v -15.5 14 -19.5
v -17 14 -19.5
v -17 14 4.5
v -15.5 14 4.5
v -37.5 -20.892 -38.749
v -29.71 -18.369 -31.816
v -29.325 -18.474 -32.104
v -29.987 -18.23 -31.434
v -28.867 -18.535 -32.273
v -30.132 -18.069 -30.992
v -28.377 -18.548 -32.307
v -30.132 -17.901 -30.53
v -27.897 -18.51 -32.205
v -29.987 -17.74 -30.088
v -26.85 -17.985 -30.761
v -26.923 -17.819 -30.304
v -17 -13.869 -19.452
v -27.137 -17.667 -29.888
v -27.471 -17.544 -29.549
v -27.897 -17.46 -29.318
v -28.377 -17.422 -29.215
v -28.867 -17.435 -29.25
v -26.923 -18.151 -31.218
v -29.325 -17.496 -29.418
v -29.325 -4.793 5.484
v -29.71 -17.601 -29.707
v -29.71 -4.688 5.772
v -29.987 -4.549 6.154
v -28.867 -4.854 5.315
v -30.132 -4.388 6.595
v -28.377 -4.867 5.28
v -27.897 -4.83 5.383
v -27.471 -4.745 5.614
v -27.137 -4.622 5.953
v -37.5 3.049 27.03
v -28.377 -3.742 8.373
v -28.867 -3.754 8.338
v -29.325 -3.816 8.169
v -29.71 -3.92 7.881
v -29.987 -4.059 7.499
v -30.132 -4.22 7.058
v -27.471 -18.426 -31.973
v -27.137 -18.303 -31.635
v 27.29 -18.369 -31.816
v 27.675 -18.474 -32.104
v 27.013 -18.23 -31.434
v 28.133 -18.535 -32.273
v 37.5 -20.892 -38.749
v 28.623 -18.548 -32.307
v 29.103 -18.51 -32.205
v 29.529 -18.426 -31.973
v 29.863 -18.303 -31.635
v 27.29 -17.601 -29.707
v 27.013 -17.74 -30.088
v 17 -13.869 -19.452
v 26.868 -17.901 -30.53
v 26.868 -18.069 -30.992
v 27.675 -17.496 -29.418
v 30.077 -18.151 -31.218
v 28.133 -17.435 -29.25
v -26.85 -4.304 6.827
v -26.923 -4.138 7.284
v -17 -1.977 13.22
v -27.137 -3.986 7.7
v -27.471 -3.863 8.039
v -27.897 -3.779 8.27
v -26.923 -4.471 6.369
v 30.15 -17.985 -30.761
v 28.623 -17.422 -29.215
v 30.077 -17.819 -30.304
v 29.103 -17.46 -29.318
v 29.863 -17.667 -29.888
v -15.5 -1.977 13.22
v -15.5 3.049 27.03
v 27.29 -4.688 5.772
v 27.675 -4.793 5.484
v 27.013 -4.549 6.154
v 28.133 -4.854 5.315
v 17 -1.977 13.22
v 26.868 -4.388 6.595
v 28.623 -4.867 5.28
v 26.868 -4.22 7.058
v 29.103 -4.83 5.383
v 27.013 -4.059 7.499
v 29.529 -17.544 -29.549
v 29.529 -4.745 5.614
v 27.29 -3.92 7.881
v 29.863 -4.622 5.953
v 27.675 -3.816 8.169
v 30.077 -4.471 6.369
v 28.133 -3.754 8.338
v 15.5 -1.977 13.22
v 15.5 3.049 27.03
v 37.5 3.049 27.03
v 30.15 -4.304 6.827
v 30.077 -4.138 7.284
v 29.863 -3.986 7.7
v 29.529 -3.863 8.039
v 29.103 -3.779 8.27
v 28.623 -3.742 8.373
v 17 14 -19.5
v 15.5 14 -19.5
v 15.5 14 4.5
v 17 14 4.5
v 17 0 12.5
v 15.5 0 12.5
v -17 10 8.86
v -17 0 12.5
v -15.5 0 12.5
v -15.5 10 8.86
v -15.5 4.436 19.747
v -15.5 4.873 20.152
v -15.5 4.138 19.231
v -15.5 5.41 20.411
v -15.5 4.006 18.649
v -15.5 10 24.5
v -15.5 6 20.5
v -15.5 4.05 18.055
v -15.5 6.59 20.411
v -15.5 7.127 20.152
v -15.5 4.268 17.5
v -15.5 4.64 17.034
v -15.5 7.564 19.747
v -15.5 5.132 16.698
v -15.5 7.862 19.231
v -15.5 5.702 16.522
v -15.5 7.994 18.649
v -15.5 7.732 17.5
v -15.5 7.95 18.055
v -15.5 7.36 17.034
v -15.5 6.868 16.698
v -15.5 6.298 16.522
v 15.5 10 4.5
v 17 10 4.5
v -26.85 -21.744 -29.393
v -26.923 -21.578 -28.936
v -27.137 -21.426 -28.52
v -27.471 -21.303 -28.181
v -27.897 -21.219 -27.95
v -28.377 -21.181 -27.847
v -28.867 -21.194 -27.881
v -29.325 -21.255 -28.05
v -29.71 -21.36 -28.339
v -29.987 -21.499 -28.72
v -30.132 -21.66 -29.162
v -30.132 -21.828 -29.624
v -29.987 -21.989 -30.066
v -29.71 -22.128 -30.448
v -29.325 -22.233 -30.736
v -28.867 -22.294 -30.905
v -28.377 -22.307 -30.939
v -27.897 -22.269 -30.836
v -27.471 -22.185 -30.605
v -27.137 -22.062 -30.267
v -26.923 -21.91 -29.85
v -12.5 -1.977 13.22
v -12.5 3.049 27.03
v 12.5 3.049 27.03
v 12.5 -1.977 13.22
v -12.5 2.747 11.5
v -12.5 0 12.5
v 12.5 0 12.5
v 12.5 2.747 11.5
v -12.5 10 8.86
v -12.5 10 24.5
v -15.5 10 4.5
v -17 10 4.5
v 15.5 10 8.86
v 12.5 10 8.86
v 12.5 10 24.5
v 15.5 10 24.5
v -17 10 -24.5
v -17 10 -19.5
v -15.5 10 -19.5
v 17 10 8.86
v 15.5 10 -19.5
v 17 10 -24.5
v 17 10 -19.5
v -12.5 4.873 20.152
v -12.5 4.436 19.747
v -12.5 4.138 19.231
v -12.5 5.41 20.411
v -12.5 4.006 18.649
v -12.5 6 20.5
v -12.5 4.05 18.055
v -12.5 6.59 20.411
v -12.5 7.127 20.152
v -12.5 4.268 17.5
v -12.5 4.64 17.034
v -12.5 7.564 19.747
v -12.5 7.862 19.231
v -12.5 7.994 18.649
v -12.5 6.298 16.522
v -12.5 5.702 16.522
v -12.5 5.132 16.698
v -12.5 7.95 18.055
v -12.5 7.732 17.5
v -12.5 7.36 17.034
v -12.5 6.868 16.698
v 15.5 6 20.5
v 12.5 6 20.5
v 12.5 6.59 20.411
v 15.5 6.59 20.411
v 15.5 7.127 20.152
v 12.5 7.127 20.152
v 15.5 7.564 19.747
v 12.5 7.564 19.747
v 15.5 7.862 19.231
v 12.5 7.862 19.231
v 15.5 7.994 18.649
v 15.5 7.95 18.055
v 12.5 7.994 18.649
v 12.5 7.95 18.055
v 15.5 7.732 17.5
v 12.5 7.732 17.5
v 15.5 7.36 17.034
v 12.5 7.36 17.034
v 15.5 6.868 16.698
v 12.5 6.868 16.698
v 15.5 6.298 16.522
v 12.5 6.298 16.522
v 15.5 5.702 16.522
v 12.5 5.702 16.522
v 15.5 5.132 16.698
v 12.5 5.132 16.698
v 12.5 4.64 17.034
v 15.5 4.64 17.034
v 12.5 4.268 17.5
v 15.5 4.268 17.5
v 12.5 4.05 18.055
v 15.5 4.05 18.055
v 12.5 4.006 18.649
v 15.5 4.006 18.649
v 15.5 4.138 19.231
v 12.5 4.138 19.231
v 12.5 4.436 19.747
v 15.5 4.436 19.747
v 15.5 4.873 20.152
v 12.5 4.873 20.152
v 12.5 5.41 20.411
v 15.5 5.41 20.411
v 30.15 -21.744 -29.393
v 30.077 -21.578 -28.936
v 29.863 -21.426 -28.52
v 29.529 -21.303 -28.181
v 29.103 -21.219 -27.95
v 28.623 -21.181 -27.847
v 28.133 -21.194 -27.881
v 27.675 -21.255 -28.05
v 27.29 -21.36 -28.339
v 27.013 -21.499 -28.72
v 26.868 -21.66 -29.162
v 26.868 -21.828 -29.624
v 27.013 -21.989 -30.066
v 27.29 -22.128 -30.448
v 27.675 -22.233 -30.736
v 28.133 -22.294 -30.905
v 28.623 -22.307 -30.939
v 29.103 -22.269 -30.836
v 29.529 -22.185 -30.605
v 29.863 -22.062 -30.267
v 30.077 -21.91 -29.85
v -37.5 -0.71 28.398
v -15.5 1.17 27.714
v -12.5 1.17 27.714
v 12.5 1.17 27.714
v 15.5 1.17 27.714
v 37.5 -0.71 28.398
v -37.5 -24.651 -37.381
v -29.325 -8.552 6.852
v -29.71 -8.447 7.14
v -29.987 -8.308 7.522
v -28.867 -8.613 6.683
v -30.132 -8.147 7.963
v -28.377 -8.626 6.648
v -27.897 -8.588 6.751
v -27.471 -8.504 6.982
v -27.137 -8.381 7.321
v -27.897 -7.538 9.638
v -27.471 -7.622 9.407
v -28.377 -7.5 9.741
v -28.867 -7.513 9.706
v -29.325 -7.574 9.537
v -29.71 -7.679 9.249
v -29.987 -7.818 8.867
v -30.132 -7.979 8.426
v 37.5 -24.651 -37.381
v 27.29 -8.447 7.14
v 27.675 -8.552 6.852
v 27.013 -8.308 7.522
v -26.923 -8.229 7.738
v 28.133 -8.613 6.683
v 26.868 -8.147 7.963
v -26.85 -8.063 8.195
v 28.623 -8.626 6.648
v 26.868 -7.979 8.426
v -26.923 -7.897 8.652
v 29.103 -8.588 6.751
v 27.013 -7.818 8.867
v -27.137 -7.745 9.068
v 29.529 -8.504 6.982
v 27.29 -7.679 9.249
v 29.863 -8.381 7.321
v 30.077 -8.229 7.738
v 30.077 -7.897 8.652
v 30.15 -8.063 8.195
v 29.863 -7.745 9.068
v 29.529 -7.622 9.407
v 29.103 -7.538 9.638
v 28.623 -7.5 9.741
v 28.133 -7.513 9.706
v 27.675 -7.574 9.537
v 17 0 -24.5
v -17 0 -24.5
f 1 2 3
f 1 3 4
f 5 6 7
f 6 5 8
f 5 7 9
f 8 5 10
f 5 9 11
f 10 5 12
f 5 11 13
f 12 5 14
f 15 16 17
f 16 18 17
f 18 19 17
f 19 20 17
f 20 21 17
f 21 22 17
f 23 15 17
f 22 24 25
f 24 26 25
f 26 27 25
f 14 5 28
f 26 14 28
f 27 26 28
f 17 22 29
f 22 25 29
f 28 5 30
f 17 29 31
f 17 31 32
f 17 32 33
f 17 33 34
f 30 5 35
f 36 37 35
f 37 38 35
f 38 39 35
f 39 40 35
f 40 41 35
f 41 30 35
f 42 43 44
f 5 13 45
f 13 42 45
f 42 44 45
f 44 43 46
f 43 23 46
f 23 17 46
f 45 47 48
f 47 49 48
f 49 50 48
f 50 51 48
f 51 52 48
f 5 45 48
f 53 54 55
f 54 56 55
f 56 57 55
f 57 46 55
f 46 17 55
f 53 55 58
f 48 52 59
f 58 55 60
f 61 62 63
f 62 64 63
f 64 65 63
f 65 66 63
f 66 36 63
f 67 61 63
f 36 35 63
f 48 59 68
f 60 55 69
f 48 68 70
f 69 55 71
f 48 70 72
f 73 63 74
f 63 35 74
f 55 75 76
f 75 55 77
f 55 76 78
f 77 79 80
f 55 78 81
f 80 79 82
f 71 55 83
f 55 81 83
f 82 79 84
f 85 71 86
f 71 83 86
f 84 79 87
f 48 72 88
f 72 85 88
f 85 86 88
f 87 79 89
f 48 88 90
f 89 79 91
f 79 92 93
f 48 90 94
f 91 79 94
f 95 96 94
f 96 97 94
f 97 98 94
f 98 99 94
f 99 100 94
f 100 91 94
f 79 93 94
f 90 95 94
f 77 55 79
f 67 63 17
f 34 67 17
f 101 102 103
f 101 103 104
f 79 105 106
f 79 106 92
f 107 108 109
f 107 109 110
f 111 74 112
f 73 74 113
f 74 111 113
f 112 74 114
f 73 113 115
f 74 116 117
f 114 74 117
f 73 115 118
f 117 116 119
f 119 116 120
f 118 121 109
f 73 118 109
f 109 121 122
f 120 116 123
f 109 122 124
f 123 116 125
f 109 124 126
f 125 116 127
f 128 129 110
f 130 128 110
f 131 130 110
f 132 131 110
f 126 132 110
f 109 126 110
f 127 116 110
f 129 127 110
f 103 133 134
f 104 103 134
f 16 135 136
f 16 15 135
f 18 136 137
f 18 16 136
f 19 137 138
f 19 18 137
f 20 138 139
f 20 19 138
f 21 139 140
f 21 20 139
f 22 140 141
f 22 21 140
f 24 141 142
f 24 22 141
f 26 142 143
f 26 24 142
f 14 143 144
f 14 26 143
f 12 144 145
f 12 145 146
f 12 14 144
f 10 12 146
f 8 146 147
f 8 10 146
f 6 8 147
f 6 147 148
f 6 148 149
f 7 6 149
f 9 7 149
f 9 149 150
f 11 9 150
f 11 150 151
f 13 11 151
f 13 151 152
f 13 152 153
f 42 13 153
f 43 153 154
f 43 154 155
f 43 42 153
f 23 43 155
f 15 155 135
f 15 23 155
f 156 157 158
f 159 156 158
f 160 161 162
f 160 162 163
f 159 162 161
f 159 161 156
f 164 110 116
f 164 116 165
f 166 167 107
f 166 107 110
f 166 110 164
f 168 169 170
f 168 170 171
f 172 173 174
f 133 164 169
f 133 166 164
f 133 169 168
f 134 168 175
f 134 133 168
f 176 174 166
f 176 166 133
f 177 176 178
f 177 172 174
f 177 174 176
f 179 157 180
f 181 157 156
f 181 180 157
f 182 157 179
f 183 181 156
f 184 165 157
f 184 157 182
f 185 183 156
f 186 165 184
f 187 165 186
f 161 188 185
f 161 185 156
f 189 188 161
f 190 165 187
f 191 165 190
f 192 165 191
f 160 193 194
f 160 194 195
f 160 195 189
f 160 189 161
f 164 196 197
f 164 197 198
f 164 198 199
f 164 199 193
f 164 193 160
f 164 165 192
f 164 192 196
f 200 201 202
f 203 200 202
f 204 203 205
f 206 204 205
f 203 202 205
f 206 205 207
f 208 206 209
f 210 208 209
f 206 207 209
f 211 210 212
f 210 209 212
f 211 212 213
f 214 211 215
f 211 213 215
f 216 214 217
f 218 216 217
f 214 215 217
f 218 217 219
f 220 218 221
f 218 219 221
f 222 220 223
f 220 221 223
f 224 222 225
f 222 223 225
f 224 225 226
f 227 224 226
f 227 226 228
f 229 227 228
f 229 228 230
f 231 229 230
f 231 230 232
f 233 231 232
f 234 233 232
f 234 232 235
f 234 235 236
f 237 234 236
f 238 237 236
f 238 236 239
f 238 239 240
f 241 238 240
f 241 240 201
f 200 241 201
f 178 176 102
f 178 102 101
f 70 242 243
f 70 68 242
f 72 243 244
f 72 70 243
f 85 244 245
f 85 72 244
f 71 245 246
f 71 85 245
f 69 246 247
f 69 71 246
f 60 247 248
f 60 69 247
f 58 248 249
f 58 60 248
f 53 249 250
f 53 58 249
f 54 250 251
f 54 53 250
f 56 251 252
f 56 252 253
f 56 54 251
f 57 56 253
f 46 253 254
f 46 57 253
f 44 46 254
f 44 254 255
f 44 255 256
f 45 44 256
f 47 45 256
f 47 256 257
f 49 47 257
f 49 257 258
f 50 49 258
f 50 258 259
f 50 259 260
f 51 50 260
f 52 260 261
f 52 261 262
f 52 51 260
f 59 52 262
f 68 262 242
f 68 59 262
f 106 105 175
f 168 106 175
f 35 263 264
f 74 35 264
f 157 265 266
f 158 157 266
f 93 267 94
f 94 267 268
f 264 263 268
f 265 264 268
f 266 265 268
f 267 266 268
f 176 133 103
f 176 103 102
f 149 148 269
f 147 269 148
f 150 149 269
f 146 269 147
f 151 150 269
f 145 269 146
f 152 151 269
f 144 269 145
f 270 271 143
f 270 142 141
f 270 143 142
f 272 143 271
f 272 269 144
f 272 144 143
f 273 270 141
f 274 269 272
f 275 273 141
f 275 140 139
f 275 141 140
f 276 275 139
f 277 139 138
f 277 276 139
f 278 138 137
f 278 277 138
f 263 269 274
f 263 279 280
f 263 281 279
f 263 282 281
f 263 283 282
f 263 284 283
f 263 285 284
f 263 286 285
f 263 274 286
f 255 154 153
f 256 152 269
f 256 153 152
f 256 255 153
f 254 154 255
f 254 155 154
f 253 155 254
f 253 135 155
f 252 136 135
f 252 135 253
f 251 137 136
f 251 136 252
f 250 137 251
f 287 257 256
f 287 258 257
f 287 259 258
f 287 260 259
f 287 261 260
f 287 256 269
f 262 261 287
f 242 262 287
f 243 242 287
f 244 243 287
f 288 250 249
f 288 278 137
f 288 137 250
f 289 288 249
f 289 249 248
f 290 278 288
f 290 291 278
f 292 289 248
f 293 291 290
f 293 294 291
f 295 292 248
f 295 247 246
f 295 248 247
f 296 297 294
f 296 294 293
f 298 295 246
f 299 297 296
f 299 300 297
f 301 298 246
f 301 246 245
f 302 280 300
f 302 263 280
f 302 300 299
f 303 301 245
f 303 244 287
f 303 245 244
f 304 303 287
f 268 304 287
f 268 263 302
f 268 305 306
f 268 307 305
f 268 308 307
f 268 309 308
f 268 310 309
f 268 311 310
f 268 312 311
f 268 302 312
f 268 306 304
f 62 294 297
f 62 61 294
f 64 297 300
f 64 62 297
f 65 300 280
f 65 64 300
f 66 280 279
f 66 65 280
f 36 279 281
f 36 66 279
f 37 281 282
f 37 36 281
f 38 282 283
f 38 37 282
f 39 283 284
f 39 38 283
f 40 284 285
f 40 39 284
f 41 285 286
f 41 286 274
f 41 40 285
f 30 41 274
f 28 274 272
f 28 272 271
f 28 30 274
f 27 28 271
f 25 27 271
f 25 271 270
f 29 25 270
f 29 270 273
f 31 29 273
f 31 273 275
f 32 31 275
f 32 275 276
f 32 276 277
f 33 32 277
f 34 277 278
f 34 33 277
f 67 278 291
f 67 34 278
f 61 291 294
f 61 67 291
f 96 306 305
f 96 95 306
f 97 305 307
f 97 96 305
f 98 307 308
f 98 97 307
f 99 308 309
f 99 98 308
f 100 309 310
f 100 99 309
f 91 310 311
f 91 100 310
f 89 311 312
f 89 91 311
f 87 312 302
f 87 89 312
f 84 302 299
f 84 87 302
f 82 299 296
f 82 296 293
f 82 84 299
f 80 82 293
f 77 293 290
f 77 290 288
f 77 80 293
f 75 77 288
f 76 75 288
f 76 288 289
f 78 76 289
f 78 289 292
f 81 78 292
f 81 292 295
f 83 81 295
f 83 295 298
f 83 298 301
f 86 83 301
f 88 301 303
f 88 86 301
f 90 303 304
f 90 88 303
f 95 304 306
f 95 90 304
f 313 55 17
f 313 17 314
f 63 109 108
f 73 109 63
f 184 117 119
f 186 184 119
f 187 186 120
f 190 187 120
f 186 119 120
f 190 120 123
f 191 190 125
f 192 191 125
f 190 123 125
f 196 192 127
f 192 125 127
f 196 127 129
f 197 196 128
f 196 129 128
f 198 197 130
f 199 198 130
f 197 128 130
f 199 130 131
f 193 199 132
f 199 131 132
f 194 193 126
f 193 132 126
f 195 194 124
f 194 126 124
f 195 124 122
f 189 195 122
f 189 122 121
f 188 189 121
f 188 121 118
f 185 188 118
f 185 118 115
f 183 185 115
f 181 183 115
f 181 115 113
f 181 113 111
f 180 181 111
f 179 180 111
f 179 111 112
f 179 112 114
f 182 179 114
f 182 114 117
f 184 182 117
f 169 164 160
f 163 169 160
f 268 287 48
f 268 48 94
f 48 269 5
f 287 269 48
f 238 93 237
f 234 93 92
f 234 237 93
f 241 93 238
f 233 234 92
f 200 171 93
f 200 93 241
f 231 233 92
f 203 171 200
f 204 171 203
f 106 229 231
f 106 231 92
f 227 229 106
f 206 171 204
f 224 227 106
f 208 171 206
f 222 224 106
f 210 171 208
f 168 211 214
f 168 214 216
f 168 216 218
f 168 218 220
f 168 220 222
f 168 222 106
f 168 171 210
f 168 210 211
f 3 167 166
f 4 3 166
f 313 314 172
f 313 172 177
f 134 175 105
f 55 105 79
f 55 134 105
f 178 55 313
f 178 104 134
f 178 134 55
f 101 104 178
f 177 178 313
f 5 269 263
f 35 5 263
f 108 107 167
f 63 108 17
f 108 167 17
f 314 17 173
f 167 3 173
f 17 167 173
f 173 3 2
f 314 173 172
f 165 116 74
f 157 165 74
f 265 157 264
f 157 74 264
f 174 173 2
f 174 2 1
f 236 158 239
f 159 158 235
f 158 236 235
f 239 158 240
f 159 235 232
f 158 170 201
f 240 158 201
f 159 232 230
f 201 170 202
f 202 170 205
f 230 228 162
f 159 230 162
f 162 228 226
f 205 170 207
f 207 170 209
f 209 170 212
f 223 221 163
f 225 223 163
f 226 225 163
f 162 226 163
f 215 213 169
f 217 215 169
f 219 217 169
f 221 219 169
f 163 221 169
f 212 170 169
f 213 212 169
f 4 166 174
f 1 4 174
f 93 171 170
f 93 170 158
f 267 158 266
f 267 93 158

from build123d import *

# Parameters (mm, degrees)
SKETCH_1_W           = 34
SKETCH_1_H           = 49
EXTRUDE_1_DEPTH      = 10
SKETCH_2_W           = 1.5
SKETCH_2_H           = 24
EXTRUDE_2_DEPTH      = 4
SKETCH_3_W           = 1.5
SKETCH_3_H           = 12
SKETCH_3_W_2         = 25
SKETCH_3_H_2         = 13
CUT_EXTRUDE_1_DEPTH  = 10
SKETCH_4_R           = 2
CUT_EXTRUDE_2_DEPTH  = 31
EXTRUDE_3_DEPTH      = 8
CUT_EXTRUDE_4_DEPTH  = 10
EXTRUDE_4_DEPTH      = 3
EXTRUDE_5_DEPTH      = 3
EXTRUDE_6_DEPTH      = 3
EXTRUDE_7_DEPTH      = 34
EXTRUDE_8_DEPTH      = 3
EXTRUDE_9_REACH      = 31.5
CUT_EXTRUDE_10_DEPTH = 1.5
CUT_EXTRUDE_11_DEPTH = 1.5
CUT_EXTRUDE_12_DEPTH = 25
SKETCH_18_W          = 75
SKETCH_18_H          = 70
SKETCH_18_R          = 1.65
EXTRUDE_10_DEPTH     = 2


with BuildPart() as part:
    # Sketch 1 → Extrude 1 (new body)
    with BuildSketch(Plane(origin=(0, 0, 0), x_dir=(1, 0, 0), z_dir=(0, 1, 0))):
        Rectangle(SKETCH_1_W, SKETCH_1_H)
    extrude(amount=EXTRUDE_1_DEPTH)

    # Sketch 2 → Extrude 2 (add)
    with BuildSketch(Plane(origin=(0, 10, 0), x_dir=(1, 0, 0), z_dir=(0, 1, 0))):
        with Locations((-16.25, 7.5)):
            Rectangle(SKETCH_2_W, SKETCH_2_H)
        with Locations((16.25, 7.5)):
            Rectangle(SKETCH_2_W, SKETCH_2_H)
    extrude(amount=EXTRUDE_2_DEPTH)

    # Sketch 3 → Cut-Extrude 1 (cut)
    with BuildSketch(Plane(origin=(0, 10, 0), x_dir=(1, 0, 0), z_dir=(0, 1, 0))):
        with Locations((-16.25, -18.5)):
            Rectangle(SKETCH_3_W, SKETCH_3_H)
        with Locations((16.25, -18.5)):
            Rectangle(SKETCH_3_W, SKETCH_3_H)
        with Locations((0, -18)):
            Rectangle(SKETCH_3_W_2, SKETCH_3_H_2)
    extrude(amount=-CUT_EXTRUDE_1_DEPTH, mode=Mode.SUBTRACT)

    # Sketch 4 → Cut-Extrude 2 (cut)
    with BuildSketch(Plane.ZY.offset(15.5)):
        with Locations((18.5, 6)):
            Circle(SKETCH_4_R)
    extrude(amount=-CUT_EXTRUDE_2_DEPTH, mode=Mode.SUBTRACT)

    # Sketch 5 → Extrude 3 (add)
    with BuildSketch(Plane.XZ):
        Polygon((4, 11.5), (-4, 11.5), (-4, 41.5), (-13, 41.5), (-13, 56.5), (13, 56.5), (13, 41.5), (4, 41.5), align=None)
    extrude(amount=-EXTRUDE_3_DEPTH)

    # Sketch 5_2 → Cut-Extrude 4 (cut)
    with BuildSketch(Plane.XZ):
        Polygon((4, 11.5), (-4, 11.5), (-4, 41.5), (-13, 41.5), (-13, 56.5), (13, 56.5), (13, 41.5), (4, 41.5), align=None)
    extrude(amount=-CUT_EXTRUDE_4_DEPTH, mode=Mode.SUBTRACT)

    # Sketch 7 → Extrude 4 (add)
    with BuildSketch(Plane.ZY.offset(15.5)):
        Polygon((24.5, 10), (27.713938048, 1.169777784), (24.5, 0), align=None)
    extrude(amount=-EXTRUDE_4_DEPTH)

    # Sketch 8 → Extrude 5 (add)
    with BuildSketch(Plane(origin=(15.5, 0, 0), x_dir=(0, 0, -1), z_dir=(1, 0, 0))):
        Polygon((-27.713938048, 1.169777784), (-24.5, 0), (-24.5, 10), align=None)
    extrude(amount=-EXTRUDE_5_DEPTH)

    # Sketch 9 → Extrude 6 (add)
    with BuildSketch(Plane(origin=(15.5, 0, 0), x_dir=(0, 0, -1), z_dir=(1, 0, 0))):
        Polygon((-12.5, 0), (-24.5, 0), (-13.903733341, -3.856725658), align=None)
    extrude(amount=-EXTRUDE_6_DEPTH)

    # Sketch 10 → Extrude 7 (add)
    with BuildSketch(Plane(origin=(17, 0, 0), x_dir=(0, 0, -1), z_dir=(1, 0, 0))):
        Polygon((-12.5, 0), (-13.903733341, -3.856725658), (18.768088856, -15.748296437), (24.5, 0), align=None)
    extrude(amount=-EXTRUDE_7_DEPTH)

    # Sketch 11 → Extrude 8 (add)
    with BuildSketch(Plane.ZY.offset(15.5)):
        Polygon((24.5, 0), (13.903733341, -3.856725658), (12.5, 0), align=None)
    extrude(amount=-EXTRUDE_8_DEPTH)

    # Sketch 12 → Extrude 9 (add, up to next)
    with BuildSketch(Plane(origin=(-12.5, 0, 0), x_dir=(0, 0, -1), z_dir=(1, 0, 0)), mode=Mode.PRIVATE) as extrude_9_sk1:
        Polygon((-12.5, 0), (-11.5, 2.747477419), (-11.5, 0), align=None)
    extrude_9_tool1 = extrude(extrude_9_sk1.sketch, amount=EXTRUDE_9_REACH, mode=Mode.PRIVATE) - part.part
    add(extrude_9_tool1.solids().sort_by_distance((-12.5, 0.915826, 11.833333))[0])

    # Sketch 13 → Cut-Extrude 10 (cut)
    with BuildSketch(Plane(origin=(17, 0, 0), x_dir=(0, 0, -1), z_dir=(1, 0, 0))):
        Polygon((-12.5, 0), (-8.860297657, 10), (-12.5, 10), align=None)
    extrude(amount=-CUT_EXTRUDE_10_DEPTH, mode=Mode.SUBTRACT)

    # Sketch 16 → Cut-Extrude 11 (cut)
    with BuildSketch(Plane.ZY.offset(17)):
        Polygon((12.5, 10), (12.5, 0), (8.860297657, 10), align=None)
    extrude(amount=-CUT_EXTRUDE_11_DEPTH, mode=Mode.SUBTRACT)

    # Sketch 17 → Cut-Extrude 12 (cut)
    with BuildSketch(Plane(origin=(-12.5, 0, 0), x_dir=(0, 0, -1), z_dir=(1, 0, 0))):
        Polygon((-11.5, 2.747477419), (-11.5, 10), (-8.860297657, 10), align=None)
    extrude(amount=CUT_EXTRUDE_12_DEPTH, mode=Mode.SUBTRACT)

    # Sketch 18 → Extrude 10 (add, symmetric)
    with BuildSketch(Plane(origin=(0, -7.874148219, 2.865955572), x_dir=(1, 0, 0), z_dir=(0, -0.939692621, 0.342020143))):
        with Locations((0, -8.557329357)):
            Rectangle(SKETCH_18_W, SKETCH_18_H)
        with Locations((28.5, 4.942670643)):
            Circle(SKETCH_18_R, mode=Mode.SUBTRACT)
        with Locations((28.5, -35.057329357)):
            Circle(SKETCH_18_R, mode=Mode.SUBTRACT)
        with Locations((-28.5, 4.942670643)):
            Circle(SKETCH_18_R, mode=Mode.SUBTRACT)
        with Locations((-28.5, -35.057329357)):
            Circle(SKETCH_18_R, mode=Mode.SUBTRACT)
    extrude(amount=EXTRUDE_10_DEPTH, both=True)


solid = part.part
